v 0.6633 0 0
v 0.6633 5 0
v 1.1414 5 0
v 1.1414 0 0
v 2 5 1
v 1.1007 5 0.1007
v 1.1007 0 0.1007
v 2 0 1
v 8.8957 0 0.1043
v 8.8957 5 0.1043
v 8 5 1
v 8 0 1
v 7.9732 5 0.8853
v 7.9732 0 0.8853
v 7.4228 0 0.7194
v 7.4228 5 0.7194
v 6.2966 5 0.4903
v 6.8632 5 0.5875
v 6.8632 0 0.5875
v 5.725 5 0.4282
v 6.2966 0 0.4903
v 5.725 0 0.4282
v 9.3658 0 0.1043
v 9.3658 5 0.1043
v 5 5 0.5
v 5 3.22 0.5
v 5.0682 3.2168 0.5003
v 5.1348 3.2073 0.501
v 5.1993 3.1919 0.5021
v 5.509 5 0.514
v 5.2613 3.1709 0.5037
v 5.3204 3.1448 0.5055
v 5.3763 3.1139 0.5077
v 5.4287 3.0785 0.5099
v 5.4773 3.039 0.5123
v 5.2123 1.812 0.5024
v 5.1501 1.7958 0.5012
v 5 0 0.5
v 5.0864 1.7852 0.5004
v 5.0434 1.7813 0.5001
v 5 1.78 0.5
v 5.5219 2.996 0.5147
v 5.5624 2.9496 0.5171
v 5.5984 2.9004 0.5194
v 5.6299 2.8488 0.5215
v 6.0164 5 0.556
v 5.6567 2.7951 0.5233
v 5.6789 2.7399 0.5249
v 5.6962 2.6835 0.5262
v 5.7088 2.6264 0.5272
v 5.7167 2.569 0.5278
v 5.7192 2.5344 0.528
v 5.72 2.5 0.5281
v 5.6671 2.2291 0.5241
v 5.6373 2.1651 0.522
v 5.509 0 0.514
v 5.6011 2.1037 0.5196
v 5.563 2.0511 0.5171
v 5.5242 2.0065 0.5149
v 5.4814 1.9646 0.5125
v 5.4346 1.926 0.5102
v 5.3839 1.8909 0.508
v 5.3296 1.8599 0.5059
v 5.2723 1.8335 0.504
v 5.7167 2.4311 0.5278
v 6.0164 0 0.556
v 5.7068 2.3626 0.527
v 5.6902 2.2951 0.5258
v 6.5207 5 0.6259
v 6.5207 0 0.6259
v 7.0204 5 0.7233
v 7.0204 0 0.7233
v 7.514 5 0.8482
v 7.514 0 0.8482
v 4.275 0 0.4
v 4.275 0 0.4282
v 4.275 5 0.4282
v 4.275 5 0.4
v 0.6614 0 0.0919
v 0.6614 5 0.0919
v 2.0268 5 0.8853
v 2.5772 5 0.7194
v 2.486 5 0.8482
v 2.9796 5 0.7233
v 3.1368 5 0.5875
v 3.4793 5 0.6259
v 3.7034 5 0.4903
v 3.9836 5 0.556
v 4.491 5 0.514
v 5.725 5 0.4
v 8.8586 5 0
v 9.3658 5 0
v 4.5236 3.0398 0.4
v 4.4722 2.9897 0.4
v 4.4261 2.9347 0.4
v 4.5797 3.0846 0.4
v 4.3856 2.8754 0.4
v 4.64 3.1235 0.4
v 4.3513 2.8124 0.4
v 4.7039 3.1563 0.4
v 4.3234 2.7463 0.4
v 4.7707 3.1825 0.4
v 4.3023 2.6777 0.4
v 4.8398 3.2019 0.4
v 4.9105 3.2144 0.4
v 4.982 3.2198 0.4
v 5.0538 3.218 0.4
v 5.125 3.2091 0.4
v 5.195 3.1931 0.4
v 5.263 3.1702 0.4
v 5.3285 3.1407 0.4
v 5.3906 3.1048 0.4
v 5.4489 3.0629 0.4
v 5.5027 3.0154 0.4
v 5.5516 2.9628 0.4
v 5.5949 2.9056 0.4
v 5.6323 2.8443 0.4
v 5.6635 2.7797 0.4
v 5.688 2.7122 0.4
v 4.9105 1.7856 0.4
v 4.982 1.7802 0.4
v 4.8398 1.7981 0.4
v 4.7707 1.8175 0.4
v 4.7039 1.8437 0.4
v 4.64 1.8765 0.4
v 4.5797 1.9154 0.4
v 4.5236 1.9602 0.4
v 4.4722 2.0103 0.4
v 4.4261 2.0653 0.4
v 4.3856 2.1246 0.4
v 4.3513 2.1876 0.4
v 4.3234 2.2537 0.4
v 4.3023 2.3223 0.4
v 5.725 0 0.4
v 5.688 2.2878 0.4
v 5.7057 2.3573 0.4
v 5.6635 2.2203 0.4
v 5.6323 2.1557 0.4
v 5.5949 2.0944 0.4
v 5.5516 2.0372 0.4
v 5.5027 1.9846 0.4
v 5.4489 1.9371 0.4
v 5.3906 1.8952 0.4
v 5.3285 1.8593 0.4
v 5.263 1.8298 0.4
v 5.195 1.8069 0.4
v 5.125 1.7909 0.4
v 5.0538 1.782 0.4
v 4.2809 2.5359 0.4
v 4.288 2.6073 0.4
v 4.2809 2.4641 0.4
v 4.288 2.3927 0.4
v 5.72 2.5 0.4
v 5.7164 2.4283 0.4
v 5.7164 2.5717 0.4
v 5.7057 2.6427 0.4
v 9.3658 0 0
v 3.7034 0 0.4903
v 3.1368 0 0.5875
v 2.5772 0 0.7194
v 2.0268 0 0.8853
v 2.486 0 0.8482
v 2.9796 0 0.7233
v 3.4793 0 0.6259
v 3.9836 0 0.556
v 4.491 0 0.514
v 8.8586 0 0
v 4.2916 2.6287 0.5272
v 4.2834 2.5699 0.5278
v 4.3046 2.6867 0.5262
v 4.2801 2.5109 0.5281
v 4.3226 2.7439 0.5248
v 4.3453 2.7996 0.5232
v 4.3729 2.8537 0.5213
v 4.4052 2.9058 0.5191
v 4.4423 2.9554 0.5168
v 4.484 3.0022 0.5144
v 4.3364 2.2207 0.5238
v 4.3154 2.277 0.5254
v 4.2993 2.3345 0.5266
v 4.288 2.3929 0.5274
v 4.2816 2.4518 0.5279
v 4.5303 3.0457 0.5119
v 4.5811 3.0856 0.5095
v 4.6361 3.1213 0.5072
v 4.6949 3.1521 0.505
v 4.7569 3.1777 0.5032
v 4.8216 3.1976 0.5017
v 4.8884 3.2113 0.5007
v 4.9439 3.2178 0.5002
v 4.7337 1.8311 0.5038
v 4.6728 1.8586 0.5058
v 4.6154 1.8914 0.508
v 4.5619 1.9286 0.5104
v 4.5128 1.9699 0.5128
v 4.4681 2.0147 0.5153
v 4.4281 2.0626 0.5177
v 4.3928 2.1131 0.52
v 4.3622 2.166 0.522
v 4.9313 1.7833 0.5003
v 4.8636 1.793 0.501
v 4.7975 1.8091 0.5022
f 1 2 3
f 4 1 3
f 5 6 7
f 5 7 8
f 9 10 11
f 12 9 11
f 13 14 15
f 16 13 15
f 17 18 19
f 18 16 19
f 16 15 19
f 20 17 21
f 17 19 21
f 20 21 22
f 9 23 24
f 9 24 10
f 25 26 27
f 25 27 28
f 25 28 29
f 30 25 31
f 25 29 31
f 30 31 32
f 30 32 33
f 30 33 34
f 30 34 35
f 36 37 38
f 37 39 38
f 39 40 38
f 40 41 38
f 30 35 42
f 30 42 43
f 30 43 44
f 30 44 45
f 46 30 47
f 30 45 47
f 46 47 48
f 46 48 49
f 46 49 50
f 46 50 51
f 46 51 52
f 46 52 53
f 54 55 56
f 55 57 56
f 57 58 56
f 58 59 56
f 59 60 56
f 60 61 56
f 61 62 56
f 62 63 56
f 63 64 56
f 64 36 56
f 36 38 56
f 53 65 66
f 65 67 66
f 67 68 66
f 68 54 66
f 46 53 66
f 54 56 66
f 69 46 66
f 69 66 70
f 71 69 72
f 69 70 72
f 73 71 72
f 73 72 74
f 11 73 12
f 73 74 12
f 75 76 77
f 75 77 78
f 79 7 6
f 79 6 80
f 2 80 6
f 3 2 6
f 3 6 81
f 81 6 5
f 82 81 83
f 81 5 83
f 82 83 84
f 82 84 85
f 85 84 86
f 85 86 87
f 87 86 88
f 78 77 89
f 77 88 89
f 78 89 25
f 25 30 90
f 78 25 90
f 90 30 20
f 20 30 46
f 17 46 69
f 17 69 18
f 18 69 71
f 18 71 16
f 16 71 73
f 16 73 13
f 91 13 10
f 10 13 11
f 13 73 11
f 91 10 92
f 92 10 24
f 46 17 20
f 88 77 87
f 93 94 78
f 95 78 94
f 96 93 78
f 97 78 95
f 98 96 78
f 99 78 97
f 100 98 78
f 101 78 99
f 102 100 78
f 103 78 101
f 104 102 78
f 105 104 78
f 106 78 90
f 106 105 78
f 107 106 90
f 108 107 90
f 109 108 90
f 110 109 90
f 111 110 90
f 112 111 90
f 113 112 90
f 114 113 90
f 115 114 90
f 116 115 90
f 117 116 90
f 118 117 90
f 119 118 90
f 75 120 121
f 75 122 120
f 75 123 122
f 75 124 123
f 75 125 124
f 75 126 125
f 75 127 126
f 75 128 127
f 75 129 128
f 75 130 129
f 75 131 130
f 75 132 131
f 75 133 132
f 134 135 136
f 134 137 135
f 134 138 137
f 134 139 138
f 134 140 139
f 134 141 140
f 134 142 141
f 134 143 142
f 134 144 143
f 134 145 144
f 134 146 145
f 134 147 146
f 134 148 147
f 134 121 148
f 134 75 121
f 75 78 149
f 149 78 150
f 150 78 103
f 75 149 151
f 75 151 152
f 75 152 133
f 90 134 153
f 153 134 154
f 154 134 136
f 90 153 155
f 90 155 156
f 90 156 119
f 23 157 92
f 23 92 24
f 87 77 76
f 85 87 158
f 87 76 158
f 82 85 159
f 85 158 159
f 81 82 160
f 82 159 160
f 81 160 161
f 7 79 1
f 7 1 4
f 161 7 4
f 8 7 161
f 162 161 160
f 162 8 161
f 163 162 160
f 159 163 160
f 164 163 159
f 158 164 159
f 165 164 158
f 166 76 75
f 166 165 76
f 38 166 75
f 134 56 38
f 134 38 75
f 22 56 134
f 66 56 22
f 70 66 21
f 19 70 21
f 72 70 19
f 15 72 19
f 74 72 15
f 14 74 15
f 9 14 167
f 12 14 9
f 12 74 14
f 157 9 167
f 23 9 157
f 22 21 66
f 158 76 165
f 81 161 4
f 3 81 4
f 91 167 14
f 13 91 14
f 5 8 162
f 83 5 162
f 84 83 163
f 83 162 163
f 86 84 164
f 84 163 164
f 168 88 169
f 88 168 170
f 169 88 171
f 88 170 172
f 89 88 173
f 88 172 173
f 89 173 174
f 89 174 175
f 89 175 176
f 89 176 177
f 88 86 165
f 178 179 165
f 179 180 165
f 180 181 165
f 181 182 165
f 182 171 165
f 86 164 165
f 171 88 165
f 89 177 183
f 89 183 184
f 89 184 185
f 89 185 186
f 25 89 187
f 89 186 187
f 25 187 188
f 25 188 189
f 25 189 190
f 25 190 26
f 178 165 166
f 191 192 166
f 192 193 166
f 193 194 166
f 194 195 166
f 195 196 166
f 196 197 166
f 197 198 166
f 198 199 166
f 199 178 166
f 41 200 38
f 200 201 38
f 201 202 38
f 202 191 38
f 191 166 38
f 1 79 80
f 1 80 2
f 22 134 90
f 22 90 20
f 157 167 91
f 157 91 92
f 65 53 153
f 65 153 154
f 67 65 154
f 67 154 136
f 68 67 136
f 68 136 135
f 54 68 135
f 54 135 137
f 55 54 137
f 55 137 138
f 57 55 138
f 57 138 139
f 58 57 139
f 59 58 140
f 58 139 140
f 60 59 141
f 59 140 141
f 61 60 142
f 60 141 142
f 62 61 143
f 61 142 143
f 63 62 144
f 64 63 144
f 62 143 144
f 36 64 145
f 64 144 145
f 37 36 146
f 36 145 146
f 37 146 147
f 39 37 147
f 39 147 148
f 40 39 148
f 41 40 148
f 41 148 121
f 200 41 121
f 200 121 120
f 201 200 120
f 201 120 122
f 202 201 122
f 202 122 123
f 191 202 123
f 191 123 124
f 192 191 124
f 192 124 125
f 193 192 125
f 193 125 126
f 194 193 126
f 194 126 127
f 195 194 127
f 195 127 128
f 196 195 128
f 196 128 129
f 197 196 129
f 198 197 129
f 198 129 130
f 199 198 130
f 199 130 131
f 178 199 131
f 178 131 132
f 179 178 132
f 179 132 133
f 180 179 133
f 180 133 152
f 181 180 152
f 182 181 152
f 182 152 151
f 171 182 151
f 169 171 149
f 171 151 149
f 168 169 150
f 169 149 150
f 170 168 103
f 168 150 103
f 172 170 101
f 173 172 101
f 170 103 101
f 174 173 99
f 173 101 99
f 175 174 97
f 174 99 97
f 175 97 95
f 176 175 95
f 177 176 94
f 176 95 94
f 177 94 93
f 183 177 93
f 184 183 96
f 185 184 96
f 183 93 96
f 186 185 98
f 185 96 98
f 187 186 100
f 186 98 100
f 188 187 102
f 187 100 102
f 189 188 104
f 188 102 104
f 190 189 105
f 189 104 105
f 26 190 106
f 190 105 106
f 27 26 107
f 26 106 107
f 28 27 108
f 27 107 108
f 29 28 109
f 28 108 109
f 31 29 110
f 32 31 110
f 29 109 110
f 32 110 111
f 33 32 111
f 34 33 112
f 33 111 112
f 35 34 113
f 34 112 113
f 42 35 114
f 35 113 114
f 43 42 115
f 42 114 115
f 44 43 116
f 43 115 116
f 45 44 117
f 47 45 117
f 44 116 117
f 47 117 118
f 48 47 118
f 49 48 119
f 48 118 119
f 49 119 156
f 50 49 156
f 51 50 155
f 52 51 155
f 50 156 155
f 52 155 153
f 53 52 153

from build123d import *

# Parameters (mm, degrees)
F0_W        = 10
F0_H        = 5
F1_DEPTH    = 1
F2_T1_DEPTH = 15.2867319519
F4_DEPTH    = 25
F6_DEPTH    = 5
F8_DEPTH    = 5
F9_R        = 0.72
F10_DEPTH   = 1


# Not quite as in the source:
# - a fillet or chamfer that OpenCascade refuses, or shapes differently, is made with other operations: its cross-section is extruded or revolved along the edge and cut away or added


with BuildPart() as f1:
    # F0 (on Top) → F1 (new body)
    with BuildSketch(Plane.XY):
        with Locations((5, 2.5)):
            Rectangle(F0_W, F0_H)
    extrude(amount=F1_DEPTH)

    # F2: chamfer of 2 on 2 edges, made by hand

    # F2_s2 → F2_t1 (cut)
    with BuildSketch(Plane.XZ.offset(-10.1433659759)):
        Polygon((0, -1), (2, 1), (0, 1), align=None)
        Polygon((10, -1), (8, 1), (10, 1), align=None)
    extrude(amount=F2_T1_DEPTH, mode=Mode.SUBTRACT)

    # F3 (on face) → F4 (cut)
    with BuildSketch(Plane.XZ):
        with BuildLine():
            Line((5, 0.5), (5, 1))
            Line((5, 1), (2, 1))
            ThreePointArc((2, 1), (3.4793093674, 0.6258562046), (5, 0.5))
        make_face()
        with BuildLine():
            Line((8, 1), (5, 1))
            Line((5, 1), (5, 0.5))
            ThreePointArc((5, 0.5), (6.5206906326, 0.6258562046), (8, 1))
        make_face()
        with BuildLine():
            Line((1.1414213562, 0), (8.8585786438, 0))
            Line((8.8585786438, 0), (7.9732451927, 0.8853334511))
            ThreePointArc((7.9732451927, 0.8853334511), (5, 0.4), (2.0267548073, 0.8853334511))
            Line((2.0267548073, 0.8853334511), (1.1414213562, 0))
        make_face()
    extrude(amount=-F4_DEPTH, mode=Mode.SUBTRACT)

    # F5 (on face) → F6 (join)
    with BuildSketch(Plane.XZ):
        Polygon((8.8956828495, 0.1043171505), (9, 0), (9.3658352271, 0), (9.3658352271, 0.1043171505), align=None)
        Polygon((0.6632895378, 0), (1, 0), (1.1006881325, 0.1006881325), (0.6614453159, 0.0918707301), align=None)
    extrude(amount=-F6_DEPTH)

    # F7 (on face) → F8 (join)
    with BuildSketch(Plane.XZ):
        with BuildLine():
            Line((4.275, 0.4), (5, 0.4))
            ThreePointArc((5, 0.4), (4.6372268408, 0.4070403172), (4.275, 0.4281506663))
            Line((4.275, 0.4281506663), (4.275, 0.4))
        make_face()
        with BuildLine():
            ThreePointArc((5.725, 0.4281506663), (5.3627731592, 0.4070403172), (5, 0.4))
            Line((5, 0.4), (5.725, 0.4))
            Line((5.725, 0.4), (5.725, 0.4281506663))
        make_face()
    extrude(amount=-F8_DEPTH)

    # F9 (on face) → F10 (cut)
    with BuildSketch(Plane(origin=(0, 0, 0.4), x_dir=(1, 0, 0), z_dir=(0, 0, -1))):
        with Locations((5, -2.5)):
            Circle(F9_R)
    extrude(amount=-F10_DEPTH, mode=Mode.SUBTRACT)


solid = f1.part
